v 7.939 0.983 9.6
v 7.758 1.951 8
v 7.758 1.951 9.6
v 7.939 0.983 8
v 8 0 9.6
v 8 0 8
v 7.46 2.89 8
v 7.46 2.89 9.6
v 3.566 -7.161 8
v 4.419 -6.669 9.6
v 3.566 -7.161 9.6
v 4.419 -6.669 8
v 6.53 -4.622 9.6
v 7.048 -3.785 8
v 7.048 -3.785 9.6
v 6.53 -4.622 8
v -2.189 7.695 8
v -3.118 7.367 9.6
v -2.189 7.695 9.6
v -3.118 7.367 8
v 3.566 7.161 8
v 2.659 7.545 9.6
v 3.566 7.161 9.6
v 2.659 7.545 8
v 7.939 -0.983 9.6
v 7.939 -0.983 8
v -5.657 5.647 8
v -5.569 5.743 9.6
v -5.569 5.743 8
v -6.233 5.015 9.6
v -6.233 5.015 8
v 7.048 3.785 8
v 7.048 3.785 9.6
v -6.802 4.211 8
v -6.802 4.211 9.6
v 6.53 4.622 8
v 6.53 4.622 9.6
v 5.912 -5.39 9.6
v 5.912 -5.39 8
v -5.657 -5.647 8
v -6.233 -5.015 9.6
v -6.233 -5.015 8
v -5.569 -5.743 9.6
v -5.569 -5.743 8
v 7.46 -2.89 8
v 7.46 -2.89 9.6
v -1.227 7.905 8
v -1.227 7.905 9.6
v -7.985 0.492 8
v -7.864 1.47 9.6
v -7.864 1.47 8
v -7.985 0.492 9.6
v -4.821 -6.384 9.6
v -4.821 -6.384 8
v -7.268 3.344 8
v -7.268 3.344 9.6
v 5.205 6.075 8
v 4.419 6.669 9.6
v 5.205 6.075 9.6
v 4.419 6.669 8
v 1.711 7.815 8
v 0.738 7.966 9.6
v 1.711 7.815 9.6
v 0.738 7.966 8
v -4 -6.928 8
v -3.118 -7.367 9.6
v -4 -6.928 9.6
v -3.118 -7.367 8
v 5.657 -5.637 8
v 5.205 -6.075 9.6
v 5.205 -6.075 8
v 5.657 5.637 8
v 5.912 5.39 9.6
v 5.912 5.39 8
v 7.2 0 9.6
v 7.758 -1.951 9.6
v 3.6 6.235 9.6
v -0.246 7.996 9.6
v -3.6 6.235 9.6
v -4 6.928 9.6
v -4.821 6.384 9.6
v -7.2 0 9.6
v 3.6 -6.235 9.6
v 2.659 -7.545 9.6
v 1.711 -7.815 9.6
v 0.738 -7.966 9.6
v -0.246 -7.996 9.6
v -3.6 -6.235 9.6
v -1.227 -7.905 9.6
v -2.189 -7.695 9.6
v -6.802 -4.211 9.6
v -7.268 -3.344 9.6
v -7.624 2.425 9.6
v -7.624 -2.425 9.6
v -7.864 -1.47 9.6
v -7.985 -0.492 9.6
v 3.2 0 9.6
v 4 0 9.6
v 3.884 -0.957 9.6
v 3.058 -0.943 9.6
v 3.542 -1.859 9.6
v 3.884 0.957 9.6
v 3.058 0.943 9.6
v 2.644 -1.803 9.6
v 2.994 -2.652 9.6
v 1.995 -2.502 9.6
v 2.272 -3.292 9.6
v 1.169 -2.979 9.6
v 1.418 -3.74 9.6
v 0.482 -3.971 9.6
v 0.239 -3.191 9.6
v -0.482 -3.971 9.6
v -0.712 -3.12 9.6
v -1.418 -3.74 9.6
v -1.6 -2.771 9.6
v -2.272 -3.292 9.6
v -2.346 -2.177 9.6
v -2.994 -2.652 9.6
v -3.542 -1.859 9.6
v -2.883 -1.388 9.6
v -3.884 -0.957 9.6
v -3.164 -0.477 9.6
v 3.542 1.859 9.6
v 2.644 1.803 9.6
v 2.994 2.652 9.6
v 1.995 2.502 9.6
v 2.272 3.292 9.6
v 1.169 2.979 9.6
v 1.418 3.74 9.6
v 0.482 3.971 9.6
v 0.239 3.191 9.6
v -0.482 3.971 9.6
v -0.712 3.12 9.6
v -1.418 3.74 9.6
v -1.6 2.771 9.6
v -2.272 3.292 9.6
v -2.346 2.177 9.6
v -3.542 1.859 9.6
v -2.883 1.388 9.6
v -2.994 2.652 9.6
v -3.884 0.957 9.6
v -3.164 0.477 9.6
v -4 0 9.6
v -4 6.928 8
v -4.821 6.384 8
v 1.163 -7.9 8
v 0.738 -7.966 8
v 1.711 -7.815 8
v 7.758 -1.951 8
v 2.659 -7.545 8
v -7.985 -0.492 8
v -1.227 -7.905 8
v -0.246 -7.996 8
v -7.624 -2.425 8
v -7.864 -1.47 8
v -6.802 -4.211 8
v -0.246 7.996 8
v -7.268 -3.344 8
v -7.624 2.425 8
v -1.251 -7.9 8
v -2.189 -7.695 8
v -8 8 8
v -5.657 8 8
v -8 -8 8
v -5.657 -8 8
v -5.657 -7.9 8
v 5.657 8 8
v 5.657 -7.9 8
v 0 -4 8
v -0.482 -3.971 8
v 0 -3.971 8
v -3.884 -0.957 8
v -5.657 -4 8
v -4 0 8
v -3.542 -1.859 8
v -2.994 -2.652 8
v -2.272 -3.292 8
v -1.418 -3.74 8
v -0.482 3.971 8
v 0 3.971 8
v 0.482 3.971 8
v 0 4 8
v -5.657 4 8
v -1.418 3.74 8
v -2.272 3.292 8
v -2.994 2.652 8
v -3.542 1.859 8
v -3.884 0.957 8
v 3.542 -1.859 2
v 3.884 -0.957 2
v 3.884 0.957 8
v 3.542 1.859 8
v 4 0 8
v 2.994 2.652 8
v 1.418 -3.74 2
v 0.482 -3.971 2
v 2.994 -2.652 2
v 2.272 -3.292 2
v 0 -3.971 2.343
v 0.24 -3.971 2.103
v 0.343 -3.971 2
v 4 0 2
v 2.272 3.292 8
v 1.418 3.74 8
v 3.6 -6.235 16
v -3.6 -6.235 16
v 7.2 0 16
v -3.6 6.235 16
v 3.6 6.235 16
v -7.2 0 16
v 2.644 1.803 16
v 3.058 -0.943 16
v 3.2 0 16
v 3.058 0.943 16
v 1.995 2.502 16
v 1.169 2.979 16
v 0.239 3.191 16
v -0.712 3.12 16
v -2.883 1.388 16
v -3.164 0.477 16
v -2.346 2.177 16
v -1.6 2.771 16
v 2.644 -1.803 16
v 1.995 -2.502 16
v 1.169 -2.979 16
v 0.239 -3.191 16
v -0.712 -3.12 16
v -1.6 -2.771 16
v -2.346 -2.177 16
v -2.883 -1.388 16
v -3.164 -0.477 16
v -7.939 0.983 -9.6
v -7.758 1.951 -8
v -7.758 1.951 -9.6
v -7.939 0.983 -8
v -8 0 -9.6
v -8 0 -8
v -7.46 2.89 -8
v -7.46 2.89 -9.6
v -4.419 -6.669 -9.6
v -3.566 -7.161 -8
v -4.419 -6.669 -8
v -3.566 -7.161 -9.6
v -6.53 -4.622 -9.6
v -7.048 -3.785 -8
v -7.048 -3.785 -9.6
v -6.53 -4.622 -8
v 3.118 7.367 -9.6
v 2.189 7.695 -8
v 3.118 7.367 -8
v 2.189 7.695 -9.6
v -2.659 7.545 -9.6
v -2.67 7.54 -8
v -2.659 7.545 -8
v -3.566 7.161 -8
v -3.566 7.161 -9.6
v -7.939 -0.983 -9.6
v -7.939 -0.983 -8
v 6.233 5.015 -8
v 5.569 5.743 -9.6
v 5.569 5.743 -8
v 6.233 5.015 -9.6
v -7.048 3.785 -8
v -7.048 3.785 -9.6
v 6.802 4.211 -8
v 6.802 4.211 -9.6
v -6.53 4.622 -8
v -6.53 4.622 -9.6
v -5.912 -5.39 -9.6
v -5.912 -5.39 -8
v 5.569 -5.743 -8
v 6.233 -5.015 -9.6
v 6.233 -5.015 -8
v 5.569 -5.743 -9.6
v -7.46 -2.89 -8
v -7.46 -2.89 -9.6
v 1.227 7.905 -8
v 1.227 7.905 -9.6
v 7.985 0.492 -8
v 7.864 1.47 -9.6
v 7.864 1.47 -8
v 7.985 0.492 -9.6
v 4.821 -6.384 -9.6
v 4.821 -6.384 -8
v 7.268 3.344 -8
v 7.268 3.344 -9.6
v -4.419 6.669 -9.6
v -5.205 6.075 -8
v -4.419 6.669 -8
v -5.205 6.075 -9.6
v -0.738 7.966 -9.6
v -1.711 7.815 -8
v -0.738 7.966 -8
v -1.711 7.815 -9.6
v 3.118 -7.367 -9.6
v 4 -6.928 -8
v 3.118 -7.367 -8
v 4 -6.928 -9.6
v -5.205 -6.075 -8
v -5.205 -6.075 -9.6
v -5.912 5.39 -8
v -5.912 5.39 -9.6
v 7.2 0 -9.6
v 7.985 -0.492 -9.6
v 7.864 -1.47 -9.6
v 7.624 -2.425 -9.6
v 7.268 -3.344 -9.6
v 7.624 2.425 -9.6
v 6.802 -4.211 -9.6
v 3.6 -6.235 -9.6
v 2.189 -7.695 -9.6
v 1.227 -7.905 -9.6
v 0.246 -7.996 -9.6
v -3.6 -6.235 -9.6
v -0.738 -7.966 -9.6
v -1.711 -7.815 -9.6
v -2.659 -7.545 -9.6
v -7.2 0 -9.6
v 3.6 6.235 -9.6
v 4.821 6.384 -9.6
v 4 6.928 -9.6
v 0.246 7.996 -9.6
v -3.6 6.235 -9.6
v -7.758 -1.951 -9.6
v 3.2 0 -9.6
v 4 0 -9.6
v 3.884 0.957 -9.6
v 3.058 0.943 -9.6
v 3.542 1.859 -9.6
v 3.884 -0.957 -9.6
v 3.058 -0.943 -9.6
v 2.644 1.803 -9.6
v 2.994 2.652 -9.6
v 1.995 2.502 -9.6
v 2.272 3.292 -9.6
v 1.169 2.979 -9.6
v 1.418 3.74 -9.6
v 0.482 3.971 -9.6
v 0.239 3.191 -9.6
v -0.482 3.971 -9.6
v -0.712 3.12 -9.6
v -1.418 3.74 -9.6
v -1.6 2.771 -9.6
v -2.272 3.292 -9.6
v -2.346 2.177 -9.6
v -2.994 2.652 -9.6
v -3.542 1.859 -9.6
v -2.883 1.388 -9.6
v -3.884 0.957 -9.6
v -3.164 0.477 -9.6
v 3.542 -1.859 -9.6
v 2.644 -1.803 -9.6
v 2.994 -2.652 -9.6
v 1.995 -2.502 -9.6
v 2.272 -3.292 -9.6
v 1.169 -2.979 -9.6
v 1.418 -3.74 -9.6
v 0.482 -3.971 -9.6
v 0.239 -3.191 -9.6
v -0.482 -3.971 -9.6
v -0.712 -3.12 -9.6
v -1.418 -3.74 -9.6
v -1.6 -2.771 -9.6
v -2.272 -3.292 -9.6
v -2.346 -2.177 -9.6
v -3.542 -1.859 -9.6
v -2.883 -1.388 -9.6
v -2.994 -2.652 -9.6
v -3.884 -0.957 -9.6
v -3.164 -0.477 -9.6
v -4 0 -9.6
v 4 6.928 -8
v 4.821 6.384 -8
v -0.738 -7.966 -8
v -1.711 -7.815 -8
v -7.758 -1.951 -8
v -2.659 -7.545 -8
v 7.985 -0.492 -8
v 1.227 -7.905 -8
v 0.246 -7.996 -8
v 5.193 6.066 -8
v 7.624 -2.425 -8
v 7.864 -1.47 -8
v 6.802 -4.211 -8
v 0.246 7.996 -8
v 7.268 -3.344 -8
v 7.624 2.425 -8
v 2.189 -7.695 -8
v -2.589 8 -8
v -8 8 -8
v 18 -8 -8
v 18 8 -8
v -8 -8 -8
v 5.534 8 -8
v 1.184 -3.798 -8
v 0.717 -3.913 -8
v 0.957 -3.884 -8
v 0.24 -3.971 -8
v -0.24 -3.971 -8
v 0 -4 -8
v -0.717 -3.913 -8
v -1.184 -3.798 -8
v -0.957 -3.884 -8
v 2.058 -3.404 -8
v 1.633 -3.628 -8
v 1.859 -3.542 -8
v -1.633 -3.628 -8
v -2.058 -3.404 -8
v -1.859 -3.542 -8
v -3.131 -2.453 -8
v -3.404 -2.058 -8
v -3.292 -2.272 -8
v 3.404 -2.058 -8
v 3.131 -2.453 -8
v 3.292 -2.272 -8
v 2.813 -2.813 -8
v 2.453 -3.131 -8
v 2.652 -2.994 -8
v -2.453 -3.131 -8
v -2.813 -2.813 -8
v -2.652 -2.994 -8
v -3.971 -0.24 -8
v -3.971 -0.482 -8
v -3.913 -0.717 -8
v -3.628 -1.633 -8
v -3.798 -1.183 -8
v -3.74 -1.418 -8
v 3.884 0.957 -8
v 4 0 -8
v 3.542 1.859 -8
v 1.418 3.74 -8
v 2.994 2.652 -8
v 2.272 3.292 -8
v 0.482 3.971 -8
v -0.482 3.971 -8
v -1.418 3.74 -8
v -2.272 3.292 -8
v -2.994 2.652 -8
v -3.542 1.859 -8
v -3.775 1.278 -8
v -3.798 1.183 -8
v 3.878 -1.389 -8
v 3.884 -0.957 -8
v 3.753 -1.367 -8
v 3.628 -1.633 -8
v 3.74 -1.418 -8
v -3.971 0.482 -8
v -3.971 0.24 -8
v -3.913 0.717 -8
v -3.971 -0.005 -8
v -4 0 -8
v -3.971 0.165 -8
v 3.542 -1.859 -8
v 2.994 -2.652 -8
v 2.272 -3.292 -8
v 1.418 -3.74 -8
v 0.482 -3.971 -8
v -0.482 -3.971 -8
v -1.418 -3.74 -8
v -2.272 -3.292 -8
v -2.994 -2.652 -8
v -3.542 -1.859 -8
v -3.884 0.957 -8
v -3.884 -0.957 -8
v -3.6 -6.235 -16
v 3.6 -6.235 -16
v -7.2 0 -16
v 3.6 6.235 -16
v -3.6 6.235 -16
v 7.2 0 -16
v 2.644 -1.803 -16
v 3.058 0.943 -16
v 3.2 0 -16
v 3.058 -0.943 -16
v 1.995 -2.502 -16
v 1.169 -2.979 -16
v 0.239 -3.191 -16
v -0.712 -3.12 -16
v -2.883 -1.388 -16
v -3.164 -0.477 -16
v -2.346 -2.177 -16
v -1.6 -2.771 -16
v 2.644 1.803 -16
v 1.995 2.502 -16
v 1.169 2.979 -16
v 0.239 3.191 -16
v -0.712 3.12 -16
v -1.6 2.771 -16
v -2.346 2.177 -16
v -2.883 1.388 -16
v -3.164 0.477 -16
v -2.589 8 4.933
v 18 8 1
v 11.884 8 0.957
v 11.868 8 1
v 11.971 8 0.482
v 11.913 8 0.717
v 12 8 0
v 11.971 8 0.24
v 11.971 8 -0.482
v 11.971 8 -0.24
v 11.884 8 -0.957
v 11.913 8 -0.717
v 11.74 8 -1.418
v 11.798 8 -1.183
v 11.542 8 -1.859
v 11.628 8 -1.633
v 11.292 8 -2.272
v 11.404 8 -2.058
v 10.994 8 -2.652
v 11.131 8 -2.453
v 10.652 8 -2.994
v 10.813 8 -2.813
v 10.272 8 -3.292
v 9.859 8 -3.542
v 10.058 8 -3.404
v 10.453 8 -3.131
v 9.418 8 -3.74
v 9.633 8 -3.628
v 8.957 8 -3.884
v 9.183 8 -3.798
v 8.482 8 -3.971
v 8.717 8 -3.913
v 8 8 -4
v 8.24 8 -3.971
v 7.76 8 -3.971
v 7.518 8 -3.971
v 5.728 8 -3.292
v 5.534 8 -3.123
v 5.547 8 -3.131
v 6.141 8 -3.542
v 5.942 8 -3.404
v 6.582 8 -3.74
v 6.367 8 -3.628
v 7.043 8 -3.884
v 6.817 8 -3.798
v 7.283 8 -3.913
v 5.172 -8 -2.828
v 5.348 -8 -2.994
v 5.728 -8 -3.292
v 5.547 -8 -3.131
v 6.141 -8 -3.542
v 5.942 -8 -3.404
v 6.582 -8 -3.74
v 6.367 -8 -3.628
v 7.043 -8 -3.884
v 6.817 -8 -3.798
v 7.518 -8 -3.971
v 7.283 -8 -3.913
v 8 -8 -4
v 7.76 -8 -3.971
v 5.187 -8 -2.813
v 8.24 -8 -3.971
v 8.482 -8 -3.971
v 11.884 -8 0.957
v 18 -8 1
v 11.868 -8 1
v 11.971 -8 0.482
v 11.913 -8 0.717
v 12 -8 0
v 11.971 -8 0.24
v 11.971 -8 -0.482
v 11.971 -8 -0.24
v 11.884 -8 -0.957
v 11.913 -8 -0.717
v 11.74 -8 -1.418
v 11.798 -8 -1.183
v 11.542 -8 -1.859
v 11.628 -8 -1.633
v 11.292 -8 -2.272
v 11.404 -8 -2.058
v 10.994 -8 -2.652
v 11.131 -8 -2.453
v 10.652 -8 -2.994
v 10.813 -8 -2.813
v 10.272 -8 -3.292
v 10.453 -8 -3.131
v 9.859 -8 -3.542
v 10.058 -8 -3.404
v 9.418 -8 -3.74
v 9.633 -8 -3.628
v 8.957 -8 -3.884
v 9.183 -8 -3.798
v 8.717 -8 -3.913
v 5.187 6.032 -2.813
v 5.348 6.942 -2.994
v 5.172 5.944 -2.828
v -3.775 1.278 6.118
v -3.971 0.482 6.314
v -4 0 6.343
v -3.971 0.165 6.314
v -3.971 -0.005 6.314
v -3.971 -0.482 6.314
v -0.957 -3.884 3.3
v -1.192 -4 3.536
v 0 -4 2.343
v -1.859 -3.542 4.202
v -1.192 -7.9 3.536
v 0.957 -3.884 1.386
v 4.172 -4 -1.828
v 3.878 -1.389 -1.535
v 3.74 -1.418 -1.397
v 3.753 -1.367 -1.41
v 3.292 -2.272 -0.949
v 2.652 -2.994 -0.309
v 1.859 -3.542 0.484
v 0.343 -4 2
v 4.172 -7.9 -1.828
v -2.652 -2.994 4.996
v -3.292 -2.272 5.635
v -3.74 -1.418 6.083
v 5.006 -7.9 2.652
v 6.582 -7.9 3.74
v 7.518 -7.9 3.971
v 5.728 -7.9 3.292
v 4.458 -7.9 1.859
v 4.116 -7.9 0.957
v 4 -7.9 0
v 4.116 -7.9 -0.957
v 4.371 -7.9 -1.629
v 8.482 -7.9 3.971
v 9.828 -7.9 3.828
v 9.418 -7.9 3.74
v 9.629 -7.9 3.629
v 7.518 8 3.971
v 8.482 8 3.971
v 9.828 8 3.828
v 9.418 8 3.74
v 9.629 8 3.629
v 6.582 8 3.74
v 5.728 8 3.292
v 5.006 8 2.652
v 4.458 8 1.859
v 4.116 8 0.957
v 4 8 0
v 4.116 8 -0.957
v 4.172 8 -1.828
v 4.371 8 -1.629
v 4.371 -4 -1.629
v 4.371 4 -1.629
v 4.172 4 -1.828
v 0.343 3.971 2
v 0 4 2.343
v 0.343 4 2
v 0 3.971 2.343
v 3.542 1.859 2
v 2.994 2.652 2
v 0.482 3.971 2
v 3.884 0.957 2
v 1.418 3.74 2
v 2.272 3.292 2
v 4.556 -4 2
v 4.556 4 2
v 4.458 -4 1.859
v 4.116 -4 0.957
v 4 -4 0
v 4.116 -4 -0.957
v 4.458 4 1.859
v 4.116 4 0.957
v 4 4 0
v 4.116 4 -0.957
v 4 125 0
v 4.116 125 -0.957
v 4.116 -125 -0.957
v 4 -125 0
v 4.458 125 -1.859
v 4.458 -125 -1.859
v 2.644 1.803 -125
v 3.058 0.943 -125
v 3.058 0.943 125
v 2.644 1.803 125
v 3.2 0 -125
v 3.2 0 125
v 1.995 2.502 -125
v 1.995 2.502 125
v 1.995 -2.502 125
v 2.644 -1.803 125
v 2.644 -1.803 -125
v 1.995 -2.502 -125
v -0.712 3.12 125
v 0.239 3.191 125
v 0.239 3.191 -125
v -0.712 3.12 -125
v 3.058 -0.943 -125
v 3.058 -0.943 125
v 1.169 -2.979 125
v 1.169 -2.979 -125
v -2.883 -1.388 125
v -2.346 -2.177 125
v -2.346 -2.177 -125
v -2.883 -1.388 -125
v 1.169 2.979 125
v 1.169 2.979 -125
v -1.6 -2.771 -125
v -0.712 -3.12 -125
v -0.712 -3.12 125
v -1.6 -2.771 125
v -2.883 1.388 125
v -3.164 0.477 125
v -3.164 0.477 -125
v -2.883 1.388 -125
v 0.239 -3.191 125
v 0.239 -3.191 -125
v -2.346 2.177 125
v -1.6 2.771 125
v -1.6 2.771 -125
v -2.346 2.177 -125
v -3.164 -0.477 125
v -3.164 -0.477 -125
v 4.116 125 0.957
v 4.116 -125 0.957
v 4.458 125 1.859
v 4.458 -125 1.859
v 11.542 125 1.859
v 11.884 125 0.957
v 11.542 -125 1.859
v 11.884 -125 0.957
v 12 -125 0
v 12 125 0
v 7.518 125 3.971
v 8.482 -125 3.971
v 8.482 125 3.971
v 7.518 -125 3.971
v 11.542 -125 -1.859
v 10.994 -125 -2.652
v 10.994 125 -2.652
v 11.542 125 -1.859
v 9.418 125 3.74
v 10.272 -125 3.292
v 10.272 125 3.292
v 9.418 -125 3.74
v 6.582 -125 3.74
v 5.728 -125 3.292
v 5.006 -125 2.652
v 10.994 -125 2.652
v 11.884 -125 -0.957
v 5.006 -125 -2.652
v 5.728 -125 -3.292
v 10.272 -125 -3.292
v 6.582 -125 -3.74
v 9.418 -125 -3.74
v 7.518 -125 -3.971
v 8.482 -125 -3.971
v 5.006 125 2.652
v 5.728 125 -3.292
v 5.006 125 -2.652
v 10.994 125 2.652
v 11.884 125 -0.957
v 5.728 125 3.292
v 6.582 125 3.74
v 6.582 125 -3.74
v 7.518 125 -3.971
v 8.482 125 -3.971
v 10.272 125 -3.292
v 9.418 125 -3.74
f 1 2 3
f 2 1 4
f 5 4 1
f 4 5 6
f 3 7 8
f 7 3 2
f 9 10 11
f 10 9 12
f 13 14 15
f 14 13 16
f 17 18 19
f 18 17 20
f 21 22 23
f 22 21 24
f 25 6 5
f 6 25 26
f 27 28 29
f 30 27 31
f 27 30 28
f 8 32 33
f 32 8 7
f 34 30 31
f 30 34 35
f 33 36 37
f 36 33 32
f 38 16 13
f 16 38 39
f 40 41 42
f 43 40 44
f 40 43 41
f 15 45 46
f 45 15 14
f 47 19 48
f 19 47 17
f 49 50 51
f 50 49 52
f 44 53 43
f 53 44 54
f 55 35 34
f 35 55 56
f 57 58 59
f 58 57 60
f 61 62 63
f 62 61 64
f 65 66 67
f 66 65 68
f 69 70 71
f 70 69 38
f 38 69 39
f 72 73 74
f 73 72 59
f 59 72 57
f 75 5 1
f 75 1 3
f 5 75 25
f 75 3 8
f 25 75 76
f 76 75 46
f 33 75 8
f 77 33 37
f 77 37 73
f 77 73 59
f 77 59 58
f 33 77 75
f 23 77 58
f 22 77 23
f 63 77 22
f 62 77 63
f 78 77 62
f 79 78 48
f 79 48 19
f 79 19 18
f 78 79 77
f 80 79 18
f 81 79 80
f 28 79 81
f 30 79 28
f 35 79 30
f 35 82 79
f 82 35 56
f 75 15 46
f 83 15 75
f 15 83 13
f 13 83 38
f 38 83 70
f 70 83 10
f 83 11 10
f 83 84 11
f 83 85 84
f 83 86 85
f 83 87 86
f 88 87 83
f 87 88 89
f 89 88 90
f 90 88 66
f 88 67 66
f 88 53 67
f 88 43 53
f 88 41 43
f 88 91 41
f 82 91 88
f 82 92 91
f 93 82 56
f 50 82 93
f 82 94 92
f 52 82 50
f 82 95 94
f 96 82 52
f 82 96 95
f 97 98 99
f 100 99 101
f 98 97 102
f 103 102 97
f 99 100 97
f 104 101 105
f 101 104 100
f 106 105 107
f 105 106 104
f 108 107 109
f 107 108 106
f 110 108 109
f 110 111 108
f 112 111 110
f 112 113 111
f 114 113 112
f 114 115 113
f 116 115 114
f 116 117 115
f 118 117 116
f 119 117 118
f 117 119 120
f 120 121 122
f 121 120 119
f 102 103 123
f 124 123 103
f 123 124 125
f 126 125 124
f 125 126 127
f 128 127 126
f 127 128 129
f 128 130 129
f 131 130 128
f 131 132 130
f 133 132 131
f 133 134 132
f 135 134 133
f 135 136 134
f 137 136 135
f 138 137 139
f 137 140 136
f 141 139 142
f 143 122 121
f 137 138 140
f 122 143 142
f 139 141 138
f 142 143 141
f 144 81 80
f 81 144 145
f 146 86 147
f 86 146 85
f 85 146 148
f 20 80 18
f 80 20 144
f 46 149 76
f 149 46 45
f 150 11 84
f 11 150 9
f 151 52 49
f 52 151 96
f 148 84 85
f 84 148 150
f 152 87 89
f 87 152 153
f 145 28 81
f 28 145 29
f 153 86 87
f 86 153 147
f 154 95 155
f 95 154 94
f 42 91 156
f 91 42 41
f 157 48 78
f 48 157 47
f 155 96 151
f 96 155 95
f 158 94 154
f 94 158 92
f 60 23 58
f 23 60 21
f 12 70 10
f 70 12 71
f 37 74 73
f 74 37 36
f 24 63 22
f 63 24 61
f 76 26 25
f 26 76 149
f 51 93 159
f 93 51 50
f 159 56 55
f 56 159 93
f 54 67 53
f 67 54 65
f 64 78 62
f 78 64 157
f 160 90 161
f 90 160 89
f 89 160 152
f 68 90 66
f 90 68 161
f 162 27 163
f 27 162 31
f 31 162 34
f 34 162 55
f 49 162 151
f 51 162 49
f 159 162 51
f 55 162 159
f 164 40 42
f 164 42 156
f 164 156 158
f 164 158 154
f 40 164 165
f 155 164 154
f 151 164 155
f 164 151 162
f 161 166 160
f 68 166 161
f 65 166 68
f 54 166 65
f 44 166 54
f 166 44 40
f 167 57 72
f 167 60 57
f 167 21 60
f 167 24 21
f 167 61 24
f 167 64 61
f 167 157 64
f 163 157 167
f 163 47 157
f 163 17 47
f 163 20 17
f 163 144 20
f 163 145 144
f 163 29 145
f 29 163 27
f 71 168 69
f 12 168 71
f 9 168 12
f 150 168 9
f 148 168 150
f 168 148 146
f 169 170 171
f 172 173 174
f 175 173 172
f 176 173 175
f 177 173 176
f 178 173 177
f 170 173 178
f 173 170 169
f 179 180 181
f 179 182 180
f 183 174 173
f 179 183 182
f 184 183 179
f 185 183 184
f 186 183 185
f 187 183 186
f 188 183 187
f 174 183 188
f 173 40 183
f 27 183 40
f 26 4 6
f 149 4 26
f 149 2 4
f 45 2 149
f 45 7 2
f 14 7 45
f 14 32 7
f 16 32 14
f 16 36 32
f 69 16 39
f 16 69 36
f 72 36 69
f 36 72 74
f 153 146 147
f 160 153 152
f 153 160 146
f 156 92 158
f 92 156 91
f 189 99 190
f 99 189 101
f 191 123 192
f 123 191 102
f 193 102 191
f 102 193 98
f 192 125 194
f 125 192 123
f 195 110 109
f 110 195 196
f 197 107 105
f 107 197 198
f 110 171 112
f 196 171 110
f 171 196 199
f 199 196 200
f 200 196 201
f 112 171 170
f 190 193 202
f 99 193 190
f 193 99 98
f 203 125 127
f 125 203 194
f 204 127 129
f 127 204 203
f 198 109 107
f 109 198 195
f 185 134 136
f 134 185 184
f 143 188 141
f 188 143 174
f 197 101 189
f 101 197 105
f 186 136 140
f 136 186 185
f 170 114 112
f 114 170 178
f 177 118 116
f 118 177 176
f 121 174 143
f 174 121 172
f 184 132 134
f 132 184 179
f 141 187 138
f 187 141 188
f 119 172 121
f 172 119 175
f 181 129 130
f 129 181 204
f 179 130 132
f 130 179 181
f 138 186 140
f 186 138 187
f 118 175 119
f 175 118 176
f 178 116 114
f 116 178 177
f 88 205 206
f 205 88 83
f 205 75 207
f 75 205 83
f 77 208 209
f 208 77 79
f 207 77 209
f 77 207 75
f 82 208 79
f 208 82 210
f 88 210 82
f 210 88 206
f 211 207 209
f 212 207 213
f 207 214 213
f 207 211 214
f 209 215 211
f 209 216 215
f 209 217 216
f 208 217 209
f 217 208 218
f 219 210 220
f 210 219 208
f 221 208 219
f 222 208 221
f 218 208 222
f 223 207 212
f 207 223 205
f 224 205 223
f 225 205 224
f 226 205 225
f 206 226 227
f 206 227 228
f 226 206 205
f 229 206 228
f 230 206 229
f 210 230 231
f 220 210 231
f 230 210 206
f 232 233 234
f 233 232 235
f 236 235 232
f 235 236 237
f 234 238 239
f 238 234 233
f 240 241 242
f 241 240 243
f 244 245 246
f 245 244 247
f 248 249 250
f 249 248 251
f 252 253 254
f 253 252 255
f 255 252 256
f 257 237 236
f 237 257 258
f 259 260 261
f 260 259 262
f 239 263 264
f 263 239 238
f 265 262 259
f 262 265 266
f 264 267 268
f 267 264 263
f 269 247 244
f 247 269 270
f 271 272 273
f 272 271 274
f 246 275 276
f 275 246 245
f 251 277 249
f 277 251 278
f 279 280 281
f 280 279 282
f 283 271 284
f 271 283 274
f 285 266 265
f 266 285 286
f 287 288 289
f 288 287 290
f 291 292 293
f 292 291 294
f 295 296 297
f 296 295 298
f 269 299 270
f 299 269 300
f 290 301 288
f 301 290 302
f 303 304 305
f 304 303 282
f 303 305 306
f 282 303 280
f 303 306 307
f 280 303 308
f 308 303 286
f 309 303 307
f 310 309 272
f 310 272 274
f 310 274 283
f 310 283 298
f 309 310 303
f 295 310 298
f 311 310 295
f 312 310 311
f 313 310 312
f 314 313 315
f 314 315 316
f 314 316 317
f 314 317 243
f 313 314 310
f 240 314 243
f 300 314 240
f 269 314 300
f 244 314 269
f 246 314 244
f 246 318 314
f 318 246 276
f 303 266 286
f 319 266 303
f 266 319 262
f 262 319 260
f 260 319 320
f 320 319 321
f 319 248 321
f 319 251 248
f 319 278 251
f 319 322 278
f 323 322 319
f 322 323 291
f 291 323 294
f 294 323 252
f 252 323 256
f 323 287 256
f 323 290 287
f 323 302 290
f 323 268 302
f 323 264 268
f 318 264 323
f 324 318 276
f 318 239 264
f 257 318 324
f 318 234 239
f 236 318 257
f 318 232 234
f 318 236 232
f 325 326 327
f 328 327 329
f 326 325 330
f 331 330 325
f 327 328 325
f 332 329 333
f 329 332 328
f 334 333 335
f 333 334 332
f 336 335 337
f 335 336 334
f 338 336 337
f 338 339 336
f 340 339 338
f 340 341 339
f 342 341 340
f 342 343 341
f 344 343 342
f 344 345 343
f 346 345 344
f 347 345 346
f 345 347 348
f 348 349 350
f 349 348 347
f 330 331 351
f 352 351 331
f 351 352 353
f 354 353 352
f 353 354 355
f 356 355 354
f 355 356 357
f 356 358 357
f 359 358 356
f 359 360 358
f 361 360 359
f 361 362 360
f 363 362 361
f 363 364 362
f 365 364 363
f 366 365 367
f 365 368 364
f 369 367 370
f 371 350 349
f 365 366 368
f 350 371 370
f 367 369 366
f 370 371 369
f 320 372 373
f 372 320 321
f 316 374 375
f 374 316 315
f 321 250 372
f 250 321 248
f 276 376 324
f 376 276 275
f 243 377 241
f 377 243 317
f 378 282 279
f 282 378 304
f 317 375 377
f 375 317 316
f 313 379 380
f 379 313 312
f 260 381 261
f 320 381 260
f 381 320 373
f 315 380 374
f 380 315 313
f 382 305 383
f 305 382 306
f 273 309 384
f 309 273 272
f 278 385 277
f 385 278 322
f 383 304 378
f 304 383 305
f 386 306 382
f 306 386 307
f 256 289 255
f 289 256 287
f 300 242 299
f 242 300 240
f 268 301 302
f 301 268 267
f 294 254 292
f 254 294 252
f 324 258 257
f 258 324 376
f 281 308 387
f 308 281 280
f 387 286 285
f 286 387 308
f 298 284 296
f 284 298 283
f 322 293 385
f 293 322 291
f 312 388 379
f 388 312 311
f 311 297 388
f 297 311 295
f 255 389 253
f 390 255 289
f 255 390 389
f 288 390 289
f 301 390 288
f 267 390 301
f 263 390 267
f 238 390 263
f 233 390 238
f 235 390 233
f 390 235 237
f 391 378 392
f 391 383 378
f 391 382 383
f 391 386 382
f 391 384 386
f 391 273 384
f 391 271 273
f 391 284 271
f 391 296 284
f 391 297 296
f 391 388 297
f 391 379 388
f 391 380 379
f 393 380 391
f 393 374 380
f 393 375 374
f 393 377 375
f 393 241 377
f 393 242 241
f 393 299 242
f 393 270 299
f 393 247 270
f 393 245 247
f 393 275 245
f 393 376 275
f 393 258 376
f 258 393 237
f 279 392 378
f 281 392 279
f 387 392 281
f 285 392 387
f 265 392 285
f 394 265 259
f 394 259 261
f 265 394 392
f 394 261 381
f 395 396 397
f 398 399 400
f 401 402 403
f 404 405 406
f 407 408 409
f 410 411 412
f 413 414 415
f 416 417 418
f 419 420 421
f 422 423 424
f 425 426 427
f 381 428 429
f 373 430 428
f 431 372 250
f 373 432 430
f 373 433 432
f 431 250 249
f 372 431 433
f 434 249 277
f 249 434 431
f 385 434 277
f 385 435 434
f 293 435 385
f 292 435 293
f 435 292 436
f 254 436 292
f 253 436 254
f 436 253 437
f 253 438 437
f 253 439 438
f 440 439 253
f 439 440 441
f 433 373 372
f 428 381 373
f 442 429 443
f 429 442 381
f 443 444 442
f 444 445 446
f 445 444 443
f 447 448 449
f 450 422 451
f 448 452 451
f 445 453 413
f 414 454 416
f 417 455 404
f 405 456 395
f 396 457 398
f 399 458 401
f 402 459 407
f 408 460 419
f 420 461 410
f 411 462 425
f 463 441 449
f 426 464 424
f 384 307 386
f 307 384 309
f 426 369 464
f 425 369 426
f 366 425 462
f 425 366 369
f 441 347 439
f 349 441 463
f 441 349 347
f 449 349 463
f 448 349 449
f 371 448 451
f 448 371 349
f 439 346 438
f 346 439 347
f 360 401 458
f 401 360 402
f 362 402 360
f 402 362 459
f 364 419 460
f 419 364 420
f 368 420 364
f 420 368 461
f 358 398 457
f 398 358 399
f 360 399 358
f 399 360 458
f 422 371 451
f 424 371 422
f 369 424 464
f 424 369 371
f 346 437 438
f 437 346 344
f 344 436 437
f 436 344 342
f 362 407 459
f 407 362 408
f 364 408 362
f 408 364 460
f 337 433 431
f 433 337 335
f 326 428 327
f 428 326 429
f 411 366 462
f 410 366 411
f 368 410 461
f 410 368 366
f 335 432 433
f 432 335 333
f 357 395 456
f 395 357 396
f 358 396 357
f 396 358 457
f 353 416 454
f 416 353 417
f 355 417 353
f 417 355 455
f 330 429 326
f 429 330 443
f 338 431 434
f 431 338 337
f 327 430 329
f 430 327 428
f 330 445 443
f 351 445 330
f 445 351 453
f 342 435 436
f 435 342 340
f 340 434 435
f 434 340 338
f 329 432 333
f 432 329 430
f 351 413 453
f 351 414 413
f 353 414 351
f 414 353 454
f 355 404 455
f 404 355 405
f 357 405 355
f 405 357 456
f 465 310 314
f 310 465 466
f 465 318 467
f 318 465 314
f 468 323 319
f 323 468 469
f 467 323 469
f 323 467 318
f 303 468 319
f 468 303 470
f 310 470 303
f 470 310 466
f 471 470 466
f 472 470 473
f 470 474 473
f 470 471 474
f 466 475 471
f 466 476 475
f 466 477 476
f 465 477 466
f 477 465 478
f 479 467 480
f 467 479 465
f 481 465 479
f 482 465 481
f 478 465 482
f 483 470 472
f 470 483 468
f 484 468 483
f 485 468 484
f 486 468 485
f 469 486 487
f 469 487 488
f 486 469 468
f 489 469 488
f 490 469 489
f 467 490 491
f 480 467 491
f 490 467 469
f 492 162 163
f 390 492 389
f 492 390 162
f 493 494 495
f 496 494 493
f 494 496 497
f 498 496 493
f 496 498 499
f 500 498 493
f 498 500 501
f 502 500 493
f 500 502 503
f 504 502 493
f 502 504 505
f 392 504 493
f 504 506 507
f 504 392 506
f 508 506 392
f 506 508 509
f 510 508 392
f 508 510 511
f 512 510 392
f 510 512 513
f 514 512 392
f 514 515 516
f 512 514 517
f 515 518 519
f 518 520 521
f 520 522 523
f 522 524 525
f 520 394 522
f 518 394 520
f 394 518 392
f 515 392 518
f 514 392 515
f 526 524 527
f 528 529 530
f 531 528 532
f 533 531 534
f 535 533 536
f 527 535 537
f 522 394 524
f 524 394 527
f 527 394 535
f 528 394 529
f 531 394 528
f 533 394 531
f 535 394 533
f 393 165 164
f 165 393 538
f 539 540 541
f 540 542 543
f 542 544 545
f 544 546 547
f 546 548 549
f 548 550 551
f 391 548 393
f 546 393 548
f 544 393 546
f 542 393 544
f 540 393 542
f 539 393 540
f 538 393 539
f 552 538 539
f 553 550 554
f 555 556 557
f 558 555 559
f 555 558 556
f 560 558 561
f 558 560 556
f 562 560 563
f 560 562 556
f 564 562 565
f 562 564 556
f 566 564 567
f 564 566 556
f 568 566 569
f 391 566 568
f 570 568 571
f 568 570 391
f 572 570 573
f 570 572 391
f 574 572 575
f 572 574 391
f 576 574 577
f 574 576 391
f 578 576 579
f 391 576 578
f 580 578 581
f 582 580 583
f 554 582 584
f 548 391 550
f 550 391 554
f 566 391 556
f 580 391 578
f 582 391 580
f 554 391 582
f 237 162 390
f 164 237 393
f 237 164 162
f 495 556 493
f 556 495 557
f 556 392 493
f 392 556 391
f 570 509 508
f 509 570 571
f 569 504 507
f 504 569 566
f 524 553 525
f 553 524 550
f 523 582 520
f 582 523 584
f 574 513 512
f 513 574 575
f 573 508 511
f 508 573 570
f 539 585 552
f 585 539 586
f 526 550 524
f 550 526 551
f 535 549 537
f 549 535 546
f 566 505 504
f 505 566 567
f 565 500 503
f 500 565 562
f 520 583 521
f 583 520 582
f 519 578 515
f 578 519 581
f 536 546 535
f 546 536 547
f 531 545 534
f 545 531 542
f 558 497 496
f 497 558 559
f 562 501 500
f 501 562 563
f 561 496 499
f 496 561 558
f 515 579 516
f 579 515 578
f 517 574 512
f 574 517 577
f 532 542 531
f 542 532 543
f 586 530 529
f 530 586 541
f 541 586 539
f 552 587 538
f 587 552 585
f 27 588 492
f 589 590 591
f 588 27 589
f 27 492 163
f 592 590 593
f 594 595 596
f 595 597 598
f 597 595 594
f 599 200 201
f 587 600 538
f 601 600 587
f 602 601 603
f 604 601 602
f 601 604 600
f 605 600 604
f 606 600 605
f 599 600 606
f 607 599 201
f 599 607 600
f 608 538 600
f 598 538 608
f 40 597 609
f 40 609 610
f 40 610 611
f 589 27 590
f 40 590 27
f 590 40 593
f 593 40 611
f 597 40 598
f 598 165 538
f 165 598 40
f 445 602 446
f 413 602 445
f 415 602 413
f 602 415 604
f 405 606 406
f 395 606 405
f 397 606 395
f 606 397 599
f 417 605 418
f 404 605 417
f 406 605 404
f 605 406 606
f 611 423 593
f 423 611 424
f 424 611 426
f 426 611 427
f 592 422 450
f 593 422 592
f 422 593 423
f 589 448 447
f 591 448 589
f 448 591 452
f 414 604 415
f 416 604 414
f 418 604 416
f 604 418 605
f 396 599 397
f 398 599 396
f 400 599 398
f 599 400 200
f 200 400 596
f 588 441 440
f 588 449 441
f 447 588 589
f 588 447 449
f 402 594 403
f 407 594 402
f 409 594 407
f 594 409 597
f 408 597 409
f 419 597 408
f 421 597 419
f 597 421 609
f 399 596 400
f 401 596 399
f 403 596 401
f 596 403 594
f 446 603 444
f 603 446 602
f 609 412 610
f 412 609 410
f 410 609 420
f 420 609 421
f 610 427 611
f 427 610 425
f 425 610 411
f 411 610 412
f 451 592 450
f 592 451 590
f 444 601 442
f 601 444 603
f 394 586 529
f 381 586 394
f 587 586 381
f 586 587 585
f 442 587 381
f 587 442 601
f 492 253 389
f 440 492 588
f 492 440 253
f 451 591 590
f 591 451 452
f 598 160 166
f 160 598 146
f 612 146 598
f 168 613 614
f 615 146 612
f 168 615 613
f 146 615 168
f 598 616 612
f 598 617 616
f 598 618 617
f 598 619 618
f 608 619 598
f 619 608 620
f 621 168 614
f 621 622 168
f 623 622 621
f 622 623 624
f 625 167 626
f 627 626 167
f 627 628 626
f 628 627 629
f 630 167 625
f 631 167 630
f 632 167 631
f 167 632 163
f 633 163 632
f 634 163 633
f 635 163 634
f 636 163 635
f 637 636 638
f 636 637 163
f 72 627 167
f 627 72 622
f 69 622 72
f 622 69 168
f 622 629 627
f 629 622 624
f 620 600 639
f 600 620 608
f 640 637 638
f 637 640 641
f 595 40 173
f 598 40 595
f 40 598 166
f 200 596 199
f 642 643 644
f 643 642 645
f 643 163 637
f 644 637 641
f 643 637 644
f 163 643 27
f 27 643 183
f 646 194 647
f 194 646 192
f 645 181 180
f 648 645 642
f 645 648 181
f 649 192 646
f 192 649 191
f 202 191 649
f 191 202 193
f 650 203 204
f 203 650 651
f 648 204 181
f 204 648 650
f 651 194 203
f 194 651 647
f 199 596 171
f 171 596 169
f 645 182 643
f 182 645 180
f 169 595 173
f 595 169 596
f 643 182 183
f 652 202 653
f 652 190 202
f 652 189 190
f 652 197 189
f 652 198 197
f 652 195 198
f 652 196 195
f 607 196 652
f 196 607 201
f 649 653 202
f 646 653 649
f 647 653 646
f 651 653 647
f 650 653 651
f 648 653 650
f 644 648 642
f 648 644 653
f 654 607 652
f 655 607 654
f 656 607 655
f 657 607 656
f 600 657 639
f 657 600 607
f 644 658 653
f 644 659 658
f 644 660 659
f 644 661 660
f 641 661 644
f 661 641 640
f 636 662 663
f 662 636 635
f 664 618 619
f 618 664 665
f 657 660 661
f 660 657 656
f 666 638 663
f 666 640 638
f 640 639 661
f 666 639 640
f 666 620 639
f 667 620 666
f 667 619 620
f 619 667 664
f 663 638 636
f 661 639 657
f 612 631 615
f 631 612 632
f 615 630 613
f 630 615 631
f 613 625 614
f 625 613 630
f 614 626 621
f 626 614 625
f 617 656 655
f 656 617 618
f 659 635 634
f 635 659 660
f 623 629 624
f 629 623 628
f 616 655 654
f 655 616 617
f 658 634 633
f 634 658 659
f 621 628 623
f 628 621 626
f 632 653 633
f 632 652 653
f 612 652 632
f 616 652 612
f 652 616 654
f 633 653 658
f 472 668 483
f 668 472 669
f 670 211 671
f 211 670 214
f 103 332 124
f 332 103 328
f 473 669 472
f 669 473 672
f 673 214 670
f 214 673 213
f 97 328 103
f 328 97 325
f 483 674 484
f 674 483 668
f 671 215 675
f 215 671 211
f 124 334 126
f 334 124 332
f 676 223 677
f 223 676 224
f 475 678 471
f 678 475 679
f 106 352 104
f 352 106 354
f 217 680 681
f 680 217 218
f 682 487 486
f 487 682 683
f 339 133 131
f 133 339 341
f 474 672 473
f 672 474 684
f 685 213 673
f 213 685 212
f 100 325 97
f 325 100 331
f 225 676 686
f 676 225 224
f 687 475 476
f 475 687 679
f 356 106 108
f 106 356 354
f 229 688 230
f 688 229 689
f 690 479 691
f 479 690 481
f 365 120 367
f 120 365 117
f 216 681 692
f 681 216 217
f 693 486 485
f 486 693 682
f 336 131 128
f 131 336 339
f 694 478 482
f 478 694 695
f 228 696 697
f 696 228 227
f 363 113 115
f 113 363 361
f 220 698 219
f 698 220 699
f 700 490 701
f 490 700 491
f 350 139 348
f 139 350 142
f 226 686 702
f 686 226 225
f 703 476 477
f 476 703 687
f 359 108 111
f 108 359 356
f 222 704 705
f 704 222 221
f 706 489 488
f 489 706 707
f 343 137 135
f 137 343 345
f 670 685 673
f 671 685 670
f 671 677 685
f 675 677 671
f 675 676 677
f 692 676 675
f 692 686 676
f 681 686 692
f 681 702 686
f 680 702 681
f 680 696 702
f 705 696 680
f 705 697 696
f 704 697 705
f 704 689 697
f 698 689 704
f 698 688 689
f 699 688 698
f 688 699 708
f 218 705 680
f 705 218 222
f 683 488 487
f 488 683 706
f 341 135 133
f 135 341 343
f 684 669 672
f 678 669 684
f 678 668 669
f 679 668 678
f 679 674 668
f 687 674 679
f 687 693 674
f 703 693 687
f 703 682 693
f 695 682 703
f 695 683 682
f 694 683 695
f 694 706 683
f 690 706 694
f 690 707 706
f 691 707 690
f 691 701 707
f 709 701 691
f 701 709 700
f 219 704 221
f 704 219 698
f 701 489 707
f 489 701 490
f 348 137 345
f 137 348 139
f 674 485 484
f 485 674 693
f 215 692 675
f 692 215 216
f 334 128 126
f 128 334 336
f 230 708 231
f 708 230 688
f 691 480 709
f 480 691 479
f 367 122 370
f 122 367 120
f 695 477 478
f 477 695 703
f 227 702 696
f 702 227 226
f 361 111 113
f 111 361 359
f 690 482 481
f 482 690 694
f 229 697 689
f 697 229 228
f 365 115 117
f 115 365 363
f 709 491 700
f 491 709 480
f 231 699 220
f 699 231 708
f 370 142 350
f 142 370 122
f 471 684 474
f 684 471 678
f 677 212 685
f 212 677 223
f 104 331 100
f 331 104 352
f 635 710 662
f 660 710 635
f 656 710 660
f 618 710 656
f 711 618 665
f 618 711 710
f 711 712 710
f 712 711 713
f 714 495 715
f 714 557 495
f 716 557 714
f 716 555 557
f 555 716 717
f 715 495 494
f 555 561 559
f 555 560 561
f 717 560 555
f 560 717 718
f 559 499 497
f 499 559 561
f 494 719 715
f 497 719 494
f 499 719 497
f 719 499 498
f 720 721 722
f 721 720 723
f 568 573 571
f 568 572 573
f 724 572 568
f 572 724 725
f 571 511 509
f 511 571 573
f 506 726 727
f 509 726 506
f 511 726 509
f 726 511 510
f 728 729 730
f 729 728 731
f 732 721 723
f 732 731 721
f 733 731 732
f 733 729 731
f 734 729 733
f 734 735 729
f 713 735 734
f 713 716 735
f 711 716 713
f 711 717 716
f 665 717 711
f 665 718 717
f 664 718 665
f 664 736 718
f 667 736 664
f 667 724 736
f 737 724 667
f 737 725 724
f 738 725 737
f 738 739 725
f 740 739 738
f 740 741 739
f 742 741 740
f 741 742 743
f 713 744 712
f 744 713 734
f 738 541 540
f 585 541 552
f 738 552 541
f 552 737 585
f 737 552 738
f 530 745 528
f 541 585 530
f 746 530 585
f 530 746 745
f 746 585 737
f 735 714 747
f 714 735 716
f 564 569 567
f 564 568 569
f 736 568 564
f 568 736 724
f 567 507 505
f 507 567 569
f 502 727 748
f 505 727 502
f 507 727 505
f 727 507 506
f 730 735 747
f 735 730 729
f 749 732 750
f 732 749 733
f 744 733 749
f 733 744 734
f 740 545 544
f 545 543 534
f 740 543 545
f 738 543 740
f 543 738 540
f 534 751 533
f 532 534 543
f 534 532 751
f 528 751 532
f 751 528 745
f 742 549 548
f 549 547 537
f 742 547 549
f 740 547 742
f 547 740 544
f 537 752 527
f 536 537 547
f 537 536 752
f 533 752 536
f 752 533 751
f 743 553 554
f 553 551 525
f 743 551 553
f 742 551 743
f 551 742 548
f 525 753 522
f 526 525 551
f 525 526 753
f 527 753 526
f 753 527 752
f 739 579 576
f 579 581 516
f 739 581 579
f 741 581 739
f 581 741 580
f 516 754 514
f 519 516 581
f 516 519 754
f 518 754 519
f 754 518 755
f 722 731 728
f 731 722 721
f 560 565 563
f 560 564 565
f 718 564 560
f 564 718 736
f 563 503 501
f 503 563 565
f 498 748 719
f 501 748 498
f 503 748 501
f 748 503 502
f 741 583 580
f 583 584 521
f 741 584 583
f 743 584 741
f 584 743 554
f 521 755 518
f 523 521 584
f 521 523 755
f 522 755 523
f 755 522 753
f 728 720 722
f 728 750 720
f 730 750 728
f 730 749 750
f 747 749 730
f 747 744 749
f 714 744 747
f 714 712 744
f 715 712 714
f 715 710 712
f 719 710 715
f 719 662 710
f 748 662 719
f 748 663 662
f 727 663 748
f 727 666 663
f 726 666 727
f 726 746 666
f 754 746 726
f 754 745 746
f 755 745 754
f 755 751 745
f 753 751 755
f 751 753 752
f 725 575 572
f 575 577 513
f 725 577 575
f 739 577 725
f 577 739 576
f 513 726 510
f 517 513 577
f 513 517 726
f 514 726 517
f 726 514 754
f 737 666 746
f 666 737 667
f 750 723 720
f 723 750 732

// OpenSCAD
// file: ../vitamin/rod.scad
/*
 * rod
 *
 * Copyright 2013 <b@Zi.iS>
 * License CC BY 3.0
 */

include <../config.scad>;

rod();

module rod(
	r = 8/2,
	h = 250
) {
	echo("Smooth rod ", r*2, "mm x ", h, "mm");
	color(color_steal) {
		cylinder(
			r = r,
			h = h
		);
	}
}

module threaded_rod(
	r = 8/2,
	h = 250,
	pitch = 1.26,
) {
	echo("Threaded rod ", r*2, "mm x ", h, "mm");
	color([.7,.7,.7]) {
		cylinder(
			r = r*.8,
			h = h
		);
		%cylinder(
			r = r,
			h = h
		);
	}

	/* Proper version but too slow
	color(color_steal) {
		linear_extrude(
			height = h,
			twist = -h/pitch*360
		) {
			translate([.866*pitch,0,0]) {
				circle(
					r=r 
				);
			}
		}
	}*/
}
// file: ../config.scad
/*
 * config
 *
 * Copyright 2013 <b@Zi.iS>
 * License CC BY 3.0
 */

$fa = 1;
$fs = 1;
preview = 1;

// preview colors
color_steal = [.8,.8,.8];
color_wood = [.3,.3,0];
color_print = [0,.8,0];

// metric bolt sizes
function m_hole(size) = size*1.1/2;
function m_pilot(size) = size*.9/2;

mounting_bolt = 3;

// slightly move and slightly elongate objects in preview to overcome scad rounding errors
module e() {
	if(preview==1) {
		translate([
			0,
			0,
			-.1
		]) {
			scale([
				1,
				1,
				1.1
			]) {
				child();
			}
		}
	} else {
		child();
	}
}

module m_washer(
	size = 3
) {
	color(color_steal) {
		difference() {
			cylinder(
				r = size/2*2,
				h = size*.2
			);
			e() cylinder(
				r = size/2,
				h = size*.2
			);
		}
	}
	translate([
		0,
		0,
		size*.2
	]) {
		child();
	}
}

module m_nut(
	size = 3
) {
	color(color_steal) {
		difference() {
			cylinder(
				r = size*1.8/2,
				h = size*.8,
				$fn = 6
			);
		}
	}
	translate([
		0,
		0,
		size*.8
	]) {
		child();
	}
}

module m_nylock(
	size = 3
) {
	color(color_steal) {
		difference() {
			cylinder(
				r = size*1.8/2,
				h = size,
				$fn = 6
			);
		}
	}
	translate([
		0,
		0,
		size
	]) {
		child();
	}
}

module screw(
	r = 1,
	h = 1,
	pitch = 5,
) {
	linear_extrude(
		height = h,
		twist = -h/pitch*360
	) {
		translate([pitch/5,0,0]) { //H=.2*p works better in plastic then ISO's H=.866*p
			circle(
				r=r 
			);
		}
	}
}

fan40 = [
	40,			//width/length
	10,			//height
	32,			//bolt pitch
	3,			//bolt
];

lm8uu = [
	15.2/2,	//outside
	8/2,	//inside
	26,		//length
];
// main file
/*
 * clamp
 *
 * stronger clamp which tightens against both rods to improve frame rigidity.
 *
 * Copyright 2012 <b@Zi.iS>
 * License CC BY 3.0
 *
 * Inspired by Michel Pollet <buserror@gmail.com>
 */

include <../config.scad>;
use <../vitamin/rod.scad>;

if(preview==1) {
	translate([
		0,
		0,
		-125
	]) {
		threaded_rod();
	}
	rotate([
		90,
		0,
		0
	]) {
		translate([
			8,
			0,
			-125
		]) {
			rod();
		}
	}
	clamp();
} else {
	translate([
		-5,
		10,
		8
	]) {
		rotate([
			0,
			-90,
			0
		]) {
			_clamp0();
		}
	}
	_clamp1();
}

module clamp(
	rod = 8,
	thickness = 4
) {
	rotate([
		0,
		180,
		0,
	]) {
		translate([
			0,
			0,
			rod
		]) {
			m_washer(rod) {
				m_nut(rod);
			}
		}
	}
	translate([
		0,
		0,
		rod
	]) {
		m_washer(rod) {
			m_nut(rod);
		}
	}
	color(color_print) {
		translate([
			rod,
			-rod,
			0
		]) {
			rotate([
				-90,
				-90,
				0
			]) {
				_clamp0(
					rod = rod,
					thickness = thickness
				);
			}
		}
		translate([
			-rod,
			rod,
			rod
		]) {
			rotate([
				0,
				180,
				180
			]) {
				_clamp1(
					rod = rod,
					thickness = thickness
				);
			}
		}
	}
}

module _clamp0(
	rod = 8,
	thickness = 4
) {
	height=rod*1.5+thickness;
	width=rod+thickness*2;
	difference() {
		union() {

			translate([
				-thickness-rod/2,
				-height,
				0
			]) {
				cube([
					thickness*2+rod,
					rod+thickness,
					width,
				]);
				cube([
					rod/2+thickness*1.25,
					rod*2+thickness*2.5,
					width,
				]);

			}		
		}

		//Rod1
		translate([
			0,
			0,
			-1
		]) {
			cylinder(
				r=rod/2,
				h=width+2
			);
		}
		rotate([
			0,
			0,
			-45
		]) {
			translate([
				0,
				-rod/2,
				-1
			]) {
				cube([
					width+2,					
					rod,
					height+2,
				]);
			}
		}

		//Rod2	
		translate([
			-rod-thickness-1,
			-rod,
			thickness+rod/2
		]) {
			rotate([
				0,
				90,
				0
			]) {
				cylinder(
					r=rod/2,
					h=rod*2+thickness*2+2
				);
			}
		}
		translate([
			-rod/2-thickness-1,
			-rod*1.5,
			thickness+rod/2
		]) {
			rotate([
				-10,
				0,
				0
			]) {
				cube([
					width+2,					
					rod,
					height,
				]);
			}
		}
	}
}

module _clamp1(
	rod = 8,
	thickness = 4
) {
	height=rod*2+thickness-.01;
	width=rod+thickness*2-0.1;

	difference() {

		intersection() {
			cube([
				height,
				width,
				width
			]);

			translate([
				rod*1.5+thickness-1,
				0,
				thickness+rod/2-1
			]) {
				rotate([
					0,
					135,
					0
				]) {
					translate([
						0,
						0,
						-rod/2
					]) {
						cube([
							width+2,					
							width,
							rod,
						]);
					}
				}
			}
		}

		//Rod1
		translate([
			rod/2+thickness,
			rod/2+thickness,
			-1
		]) {
			cylinder(
				r=rod/2,
				h=width+2
			);
		}

		translate([
			thickness-rod/2,
			thickness,
			-1
		]) {
			cube([
				rod,
				rod,
				width
			]);
		}

		//Printing
		translate([
			thickness+rod/2,
			thickness,
			thickness+rod/2-2
		]) {
			cube([
				rod,
				rod,
				width
			]);
		}

		//Rod2	
		translate([
			rod*1.5+thickness,
			width+1,
			thickness+rod/2
		]) {
			rotate([
				90,
				0,
				0
			]) {
				cylinder(
					r=rod/2,
					h=rod+thickness*2+2
				);
			}
		}
	}
}
